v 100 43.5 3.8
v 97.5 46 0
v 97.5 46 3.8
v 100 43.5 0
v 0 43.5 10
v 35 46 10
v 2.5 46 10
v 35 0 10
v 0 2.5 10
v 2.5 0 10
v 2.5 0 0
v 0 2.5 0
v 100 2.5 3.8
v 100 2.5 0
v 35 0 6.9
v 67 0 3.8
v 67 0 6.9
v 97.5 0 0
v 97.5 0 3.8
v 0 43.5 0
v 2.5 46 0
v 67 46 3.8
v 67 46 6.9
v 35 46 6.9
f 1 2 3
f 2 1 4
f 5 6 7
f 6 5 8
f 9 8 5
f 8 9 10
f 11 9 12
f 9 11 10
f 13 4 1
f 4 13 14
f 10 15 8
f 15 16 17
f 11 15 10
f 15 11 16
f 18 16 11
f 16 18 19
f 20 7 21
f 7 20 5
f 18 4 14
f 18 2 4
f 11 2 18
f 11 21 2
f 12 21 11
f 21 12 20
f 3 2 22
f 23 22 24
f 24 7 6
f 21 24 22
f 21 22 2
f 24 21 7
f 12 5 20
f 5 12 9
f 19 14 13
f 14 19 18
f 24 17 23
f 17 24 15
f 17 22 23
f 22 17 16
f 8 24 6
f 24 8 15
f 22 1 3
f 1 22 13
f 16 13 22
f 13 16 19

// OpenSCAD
$fn = 32;

// ----------------------------------------------------------------------
// Stepped bar: twostep, 100 x 46 x 10/3.8 mm
// ----------------------------------------------------------------------

// --- parameters (mm) ---
bar_l = 100;              // bar length, X
bar_w = 46;               // bar width, Y
plate_t = 10;             // thickness of the thick zone, Z
thin_t = 3.8;             // thickness of the thin zone
corner_c = 2.5;           // corner chamfer of the bar
step_cut = 6.2;           // material removed from the thin zone
stair1_x = 35;            // position of the first stair
stair2_x = 67;            // position of the second stair
mid_t = 6.9;              // thickness of the middle zone
depth_1 = 3.1;            // depth of cut 1 from the top face
depth_2 = 6.2;            // depth of cut 2 from the top face

profile = [[2.5, 0], [97.5, 0], [100, 2.5], [100, 43.5], [97.5, 46], [2.5, 46], [0, 43.5], [0, 2.5]];  // primary outline, 8 points, counter clockwise
void_1 = [[35, -1], [67, -1], [67, 47], [35, 47]];  // first stair, 4 points
void_2 = [[67, -1], [101, -1], [101, 47], [67, 47]];  // second stair, 4 points

// --- the one profile operation ---
difference() {
  linear_extrude(height = plate_t) polygon(points = profile);
  translate([0, 0, plate_t - depth_1])
    linear_extrude(height = depth_1 + 1) polygon(points = void_1);
  translate([0, 0, plate_t - depth_2])
    linear_extrude(height = depth_2 + 1) polygon(points = void_2);
}
